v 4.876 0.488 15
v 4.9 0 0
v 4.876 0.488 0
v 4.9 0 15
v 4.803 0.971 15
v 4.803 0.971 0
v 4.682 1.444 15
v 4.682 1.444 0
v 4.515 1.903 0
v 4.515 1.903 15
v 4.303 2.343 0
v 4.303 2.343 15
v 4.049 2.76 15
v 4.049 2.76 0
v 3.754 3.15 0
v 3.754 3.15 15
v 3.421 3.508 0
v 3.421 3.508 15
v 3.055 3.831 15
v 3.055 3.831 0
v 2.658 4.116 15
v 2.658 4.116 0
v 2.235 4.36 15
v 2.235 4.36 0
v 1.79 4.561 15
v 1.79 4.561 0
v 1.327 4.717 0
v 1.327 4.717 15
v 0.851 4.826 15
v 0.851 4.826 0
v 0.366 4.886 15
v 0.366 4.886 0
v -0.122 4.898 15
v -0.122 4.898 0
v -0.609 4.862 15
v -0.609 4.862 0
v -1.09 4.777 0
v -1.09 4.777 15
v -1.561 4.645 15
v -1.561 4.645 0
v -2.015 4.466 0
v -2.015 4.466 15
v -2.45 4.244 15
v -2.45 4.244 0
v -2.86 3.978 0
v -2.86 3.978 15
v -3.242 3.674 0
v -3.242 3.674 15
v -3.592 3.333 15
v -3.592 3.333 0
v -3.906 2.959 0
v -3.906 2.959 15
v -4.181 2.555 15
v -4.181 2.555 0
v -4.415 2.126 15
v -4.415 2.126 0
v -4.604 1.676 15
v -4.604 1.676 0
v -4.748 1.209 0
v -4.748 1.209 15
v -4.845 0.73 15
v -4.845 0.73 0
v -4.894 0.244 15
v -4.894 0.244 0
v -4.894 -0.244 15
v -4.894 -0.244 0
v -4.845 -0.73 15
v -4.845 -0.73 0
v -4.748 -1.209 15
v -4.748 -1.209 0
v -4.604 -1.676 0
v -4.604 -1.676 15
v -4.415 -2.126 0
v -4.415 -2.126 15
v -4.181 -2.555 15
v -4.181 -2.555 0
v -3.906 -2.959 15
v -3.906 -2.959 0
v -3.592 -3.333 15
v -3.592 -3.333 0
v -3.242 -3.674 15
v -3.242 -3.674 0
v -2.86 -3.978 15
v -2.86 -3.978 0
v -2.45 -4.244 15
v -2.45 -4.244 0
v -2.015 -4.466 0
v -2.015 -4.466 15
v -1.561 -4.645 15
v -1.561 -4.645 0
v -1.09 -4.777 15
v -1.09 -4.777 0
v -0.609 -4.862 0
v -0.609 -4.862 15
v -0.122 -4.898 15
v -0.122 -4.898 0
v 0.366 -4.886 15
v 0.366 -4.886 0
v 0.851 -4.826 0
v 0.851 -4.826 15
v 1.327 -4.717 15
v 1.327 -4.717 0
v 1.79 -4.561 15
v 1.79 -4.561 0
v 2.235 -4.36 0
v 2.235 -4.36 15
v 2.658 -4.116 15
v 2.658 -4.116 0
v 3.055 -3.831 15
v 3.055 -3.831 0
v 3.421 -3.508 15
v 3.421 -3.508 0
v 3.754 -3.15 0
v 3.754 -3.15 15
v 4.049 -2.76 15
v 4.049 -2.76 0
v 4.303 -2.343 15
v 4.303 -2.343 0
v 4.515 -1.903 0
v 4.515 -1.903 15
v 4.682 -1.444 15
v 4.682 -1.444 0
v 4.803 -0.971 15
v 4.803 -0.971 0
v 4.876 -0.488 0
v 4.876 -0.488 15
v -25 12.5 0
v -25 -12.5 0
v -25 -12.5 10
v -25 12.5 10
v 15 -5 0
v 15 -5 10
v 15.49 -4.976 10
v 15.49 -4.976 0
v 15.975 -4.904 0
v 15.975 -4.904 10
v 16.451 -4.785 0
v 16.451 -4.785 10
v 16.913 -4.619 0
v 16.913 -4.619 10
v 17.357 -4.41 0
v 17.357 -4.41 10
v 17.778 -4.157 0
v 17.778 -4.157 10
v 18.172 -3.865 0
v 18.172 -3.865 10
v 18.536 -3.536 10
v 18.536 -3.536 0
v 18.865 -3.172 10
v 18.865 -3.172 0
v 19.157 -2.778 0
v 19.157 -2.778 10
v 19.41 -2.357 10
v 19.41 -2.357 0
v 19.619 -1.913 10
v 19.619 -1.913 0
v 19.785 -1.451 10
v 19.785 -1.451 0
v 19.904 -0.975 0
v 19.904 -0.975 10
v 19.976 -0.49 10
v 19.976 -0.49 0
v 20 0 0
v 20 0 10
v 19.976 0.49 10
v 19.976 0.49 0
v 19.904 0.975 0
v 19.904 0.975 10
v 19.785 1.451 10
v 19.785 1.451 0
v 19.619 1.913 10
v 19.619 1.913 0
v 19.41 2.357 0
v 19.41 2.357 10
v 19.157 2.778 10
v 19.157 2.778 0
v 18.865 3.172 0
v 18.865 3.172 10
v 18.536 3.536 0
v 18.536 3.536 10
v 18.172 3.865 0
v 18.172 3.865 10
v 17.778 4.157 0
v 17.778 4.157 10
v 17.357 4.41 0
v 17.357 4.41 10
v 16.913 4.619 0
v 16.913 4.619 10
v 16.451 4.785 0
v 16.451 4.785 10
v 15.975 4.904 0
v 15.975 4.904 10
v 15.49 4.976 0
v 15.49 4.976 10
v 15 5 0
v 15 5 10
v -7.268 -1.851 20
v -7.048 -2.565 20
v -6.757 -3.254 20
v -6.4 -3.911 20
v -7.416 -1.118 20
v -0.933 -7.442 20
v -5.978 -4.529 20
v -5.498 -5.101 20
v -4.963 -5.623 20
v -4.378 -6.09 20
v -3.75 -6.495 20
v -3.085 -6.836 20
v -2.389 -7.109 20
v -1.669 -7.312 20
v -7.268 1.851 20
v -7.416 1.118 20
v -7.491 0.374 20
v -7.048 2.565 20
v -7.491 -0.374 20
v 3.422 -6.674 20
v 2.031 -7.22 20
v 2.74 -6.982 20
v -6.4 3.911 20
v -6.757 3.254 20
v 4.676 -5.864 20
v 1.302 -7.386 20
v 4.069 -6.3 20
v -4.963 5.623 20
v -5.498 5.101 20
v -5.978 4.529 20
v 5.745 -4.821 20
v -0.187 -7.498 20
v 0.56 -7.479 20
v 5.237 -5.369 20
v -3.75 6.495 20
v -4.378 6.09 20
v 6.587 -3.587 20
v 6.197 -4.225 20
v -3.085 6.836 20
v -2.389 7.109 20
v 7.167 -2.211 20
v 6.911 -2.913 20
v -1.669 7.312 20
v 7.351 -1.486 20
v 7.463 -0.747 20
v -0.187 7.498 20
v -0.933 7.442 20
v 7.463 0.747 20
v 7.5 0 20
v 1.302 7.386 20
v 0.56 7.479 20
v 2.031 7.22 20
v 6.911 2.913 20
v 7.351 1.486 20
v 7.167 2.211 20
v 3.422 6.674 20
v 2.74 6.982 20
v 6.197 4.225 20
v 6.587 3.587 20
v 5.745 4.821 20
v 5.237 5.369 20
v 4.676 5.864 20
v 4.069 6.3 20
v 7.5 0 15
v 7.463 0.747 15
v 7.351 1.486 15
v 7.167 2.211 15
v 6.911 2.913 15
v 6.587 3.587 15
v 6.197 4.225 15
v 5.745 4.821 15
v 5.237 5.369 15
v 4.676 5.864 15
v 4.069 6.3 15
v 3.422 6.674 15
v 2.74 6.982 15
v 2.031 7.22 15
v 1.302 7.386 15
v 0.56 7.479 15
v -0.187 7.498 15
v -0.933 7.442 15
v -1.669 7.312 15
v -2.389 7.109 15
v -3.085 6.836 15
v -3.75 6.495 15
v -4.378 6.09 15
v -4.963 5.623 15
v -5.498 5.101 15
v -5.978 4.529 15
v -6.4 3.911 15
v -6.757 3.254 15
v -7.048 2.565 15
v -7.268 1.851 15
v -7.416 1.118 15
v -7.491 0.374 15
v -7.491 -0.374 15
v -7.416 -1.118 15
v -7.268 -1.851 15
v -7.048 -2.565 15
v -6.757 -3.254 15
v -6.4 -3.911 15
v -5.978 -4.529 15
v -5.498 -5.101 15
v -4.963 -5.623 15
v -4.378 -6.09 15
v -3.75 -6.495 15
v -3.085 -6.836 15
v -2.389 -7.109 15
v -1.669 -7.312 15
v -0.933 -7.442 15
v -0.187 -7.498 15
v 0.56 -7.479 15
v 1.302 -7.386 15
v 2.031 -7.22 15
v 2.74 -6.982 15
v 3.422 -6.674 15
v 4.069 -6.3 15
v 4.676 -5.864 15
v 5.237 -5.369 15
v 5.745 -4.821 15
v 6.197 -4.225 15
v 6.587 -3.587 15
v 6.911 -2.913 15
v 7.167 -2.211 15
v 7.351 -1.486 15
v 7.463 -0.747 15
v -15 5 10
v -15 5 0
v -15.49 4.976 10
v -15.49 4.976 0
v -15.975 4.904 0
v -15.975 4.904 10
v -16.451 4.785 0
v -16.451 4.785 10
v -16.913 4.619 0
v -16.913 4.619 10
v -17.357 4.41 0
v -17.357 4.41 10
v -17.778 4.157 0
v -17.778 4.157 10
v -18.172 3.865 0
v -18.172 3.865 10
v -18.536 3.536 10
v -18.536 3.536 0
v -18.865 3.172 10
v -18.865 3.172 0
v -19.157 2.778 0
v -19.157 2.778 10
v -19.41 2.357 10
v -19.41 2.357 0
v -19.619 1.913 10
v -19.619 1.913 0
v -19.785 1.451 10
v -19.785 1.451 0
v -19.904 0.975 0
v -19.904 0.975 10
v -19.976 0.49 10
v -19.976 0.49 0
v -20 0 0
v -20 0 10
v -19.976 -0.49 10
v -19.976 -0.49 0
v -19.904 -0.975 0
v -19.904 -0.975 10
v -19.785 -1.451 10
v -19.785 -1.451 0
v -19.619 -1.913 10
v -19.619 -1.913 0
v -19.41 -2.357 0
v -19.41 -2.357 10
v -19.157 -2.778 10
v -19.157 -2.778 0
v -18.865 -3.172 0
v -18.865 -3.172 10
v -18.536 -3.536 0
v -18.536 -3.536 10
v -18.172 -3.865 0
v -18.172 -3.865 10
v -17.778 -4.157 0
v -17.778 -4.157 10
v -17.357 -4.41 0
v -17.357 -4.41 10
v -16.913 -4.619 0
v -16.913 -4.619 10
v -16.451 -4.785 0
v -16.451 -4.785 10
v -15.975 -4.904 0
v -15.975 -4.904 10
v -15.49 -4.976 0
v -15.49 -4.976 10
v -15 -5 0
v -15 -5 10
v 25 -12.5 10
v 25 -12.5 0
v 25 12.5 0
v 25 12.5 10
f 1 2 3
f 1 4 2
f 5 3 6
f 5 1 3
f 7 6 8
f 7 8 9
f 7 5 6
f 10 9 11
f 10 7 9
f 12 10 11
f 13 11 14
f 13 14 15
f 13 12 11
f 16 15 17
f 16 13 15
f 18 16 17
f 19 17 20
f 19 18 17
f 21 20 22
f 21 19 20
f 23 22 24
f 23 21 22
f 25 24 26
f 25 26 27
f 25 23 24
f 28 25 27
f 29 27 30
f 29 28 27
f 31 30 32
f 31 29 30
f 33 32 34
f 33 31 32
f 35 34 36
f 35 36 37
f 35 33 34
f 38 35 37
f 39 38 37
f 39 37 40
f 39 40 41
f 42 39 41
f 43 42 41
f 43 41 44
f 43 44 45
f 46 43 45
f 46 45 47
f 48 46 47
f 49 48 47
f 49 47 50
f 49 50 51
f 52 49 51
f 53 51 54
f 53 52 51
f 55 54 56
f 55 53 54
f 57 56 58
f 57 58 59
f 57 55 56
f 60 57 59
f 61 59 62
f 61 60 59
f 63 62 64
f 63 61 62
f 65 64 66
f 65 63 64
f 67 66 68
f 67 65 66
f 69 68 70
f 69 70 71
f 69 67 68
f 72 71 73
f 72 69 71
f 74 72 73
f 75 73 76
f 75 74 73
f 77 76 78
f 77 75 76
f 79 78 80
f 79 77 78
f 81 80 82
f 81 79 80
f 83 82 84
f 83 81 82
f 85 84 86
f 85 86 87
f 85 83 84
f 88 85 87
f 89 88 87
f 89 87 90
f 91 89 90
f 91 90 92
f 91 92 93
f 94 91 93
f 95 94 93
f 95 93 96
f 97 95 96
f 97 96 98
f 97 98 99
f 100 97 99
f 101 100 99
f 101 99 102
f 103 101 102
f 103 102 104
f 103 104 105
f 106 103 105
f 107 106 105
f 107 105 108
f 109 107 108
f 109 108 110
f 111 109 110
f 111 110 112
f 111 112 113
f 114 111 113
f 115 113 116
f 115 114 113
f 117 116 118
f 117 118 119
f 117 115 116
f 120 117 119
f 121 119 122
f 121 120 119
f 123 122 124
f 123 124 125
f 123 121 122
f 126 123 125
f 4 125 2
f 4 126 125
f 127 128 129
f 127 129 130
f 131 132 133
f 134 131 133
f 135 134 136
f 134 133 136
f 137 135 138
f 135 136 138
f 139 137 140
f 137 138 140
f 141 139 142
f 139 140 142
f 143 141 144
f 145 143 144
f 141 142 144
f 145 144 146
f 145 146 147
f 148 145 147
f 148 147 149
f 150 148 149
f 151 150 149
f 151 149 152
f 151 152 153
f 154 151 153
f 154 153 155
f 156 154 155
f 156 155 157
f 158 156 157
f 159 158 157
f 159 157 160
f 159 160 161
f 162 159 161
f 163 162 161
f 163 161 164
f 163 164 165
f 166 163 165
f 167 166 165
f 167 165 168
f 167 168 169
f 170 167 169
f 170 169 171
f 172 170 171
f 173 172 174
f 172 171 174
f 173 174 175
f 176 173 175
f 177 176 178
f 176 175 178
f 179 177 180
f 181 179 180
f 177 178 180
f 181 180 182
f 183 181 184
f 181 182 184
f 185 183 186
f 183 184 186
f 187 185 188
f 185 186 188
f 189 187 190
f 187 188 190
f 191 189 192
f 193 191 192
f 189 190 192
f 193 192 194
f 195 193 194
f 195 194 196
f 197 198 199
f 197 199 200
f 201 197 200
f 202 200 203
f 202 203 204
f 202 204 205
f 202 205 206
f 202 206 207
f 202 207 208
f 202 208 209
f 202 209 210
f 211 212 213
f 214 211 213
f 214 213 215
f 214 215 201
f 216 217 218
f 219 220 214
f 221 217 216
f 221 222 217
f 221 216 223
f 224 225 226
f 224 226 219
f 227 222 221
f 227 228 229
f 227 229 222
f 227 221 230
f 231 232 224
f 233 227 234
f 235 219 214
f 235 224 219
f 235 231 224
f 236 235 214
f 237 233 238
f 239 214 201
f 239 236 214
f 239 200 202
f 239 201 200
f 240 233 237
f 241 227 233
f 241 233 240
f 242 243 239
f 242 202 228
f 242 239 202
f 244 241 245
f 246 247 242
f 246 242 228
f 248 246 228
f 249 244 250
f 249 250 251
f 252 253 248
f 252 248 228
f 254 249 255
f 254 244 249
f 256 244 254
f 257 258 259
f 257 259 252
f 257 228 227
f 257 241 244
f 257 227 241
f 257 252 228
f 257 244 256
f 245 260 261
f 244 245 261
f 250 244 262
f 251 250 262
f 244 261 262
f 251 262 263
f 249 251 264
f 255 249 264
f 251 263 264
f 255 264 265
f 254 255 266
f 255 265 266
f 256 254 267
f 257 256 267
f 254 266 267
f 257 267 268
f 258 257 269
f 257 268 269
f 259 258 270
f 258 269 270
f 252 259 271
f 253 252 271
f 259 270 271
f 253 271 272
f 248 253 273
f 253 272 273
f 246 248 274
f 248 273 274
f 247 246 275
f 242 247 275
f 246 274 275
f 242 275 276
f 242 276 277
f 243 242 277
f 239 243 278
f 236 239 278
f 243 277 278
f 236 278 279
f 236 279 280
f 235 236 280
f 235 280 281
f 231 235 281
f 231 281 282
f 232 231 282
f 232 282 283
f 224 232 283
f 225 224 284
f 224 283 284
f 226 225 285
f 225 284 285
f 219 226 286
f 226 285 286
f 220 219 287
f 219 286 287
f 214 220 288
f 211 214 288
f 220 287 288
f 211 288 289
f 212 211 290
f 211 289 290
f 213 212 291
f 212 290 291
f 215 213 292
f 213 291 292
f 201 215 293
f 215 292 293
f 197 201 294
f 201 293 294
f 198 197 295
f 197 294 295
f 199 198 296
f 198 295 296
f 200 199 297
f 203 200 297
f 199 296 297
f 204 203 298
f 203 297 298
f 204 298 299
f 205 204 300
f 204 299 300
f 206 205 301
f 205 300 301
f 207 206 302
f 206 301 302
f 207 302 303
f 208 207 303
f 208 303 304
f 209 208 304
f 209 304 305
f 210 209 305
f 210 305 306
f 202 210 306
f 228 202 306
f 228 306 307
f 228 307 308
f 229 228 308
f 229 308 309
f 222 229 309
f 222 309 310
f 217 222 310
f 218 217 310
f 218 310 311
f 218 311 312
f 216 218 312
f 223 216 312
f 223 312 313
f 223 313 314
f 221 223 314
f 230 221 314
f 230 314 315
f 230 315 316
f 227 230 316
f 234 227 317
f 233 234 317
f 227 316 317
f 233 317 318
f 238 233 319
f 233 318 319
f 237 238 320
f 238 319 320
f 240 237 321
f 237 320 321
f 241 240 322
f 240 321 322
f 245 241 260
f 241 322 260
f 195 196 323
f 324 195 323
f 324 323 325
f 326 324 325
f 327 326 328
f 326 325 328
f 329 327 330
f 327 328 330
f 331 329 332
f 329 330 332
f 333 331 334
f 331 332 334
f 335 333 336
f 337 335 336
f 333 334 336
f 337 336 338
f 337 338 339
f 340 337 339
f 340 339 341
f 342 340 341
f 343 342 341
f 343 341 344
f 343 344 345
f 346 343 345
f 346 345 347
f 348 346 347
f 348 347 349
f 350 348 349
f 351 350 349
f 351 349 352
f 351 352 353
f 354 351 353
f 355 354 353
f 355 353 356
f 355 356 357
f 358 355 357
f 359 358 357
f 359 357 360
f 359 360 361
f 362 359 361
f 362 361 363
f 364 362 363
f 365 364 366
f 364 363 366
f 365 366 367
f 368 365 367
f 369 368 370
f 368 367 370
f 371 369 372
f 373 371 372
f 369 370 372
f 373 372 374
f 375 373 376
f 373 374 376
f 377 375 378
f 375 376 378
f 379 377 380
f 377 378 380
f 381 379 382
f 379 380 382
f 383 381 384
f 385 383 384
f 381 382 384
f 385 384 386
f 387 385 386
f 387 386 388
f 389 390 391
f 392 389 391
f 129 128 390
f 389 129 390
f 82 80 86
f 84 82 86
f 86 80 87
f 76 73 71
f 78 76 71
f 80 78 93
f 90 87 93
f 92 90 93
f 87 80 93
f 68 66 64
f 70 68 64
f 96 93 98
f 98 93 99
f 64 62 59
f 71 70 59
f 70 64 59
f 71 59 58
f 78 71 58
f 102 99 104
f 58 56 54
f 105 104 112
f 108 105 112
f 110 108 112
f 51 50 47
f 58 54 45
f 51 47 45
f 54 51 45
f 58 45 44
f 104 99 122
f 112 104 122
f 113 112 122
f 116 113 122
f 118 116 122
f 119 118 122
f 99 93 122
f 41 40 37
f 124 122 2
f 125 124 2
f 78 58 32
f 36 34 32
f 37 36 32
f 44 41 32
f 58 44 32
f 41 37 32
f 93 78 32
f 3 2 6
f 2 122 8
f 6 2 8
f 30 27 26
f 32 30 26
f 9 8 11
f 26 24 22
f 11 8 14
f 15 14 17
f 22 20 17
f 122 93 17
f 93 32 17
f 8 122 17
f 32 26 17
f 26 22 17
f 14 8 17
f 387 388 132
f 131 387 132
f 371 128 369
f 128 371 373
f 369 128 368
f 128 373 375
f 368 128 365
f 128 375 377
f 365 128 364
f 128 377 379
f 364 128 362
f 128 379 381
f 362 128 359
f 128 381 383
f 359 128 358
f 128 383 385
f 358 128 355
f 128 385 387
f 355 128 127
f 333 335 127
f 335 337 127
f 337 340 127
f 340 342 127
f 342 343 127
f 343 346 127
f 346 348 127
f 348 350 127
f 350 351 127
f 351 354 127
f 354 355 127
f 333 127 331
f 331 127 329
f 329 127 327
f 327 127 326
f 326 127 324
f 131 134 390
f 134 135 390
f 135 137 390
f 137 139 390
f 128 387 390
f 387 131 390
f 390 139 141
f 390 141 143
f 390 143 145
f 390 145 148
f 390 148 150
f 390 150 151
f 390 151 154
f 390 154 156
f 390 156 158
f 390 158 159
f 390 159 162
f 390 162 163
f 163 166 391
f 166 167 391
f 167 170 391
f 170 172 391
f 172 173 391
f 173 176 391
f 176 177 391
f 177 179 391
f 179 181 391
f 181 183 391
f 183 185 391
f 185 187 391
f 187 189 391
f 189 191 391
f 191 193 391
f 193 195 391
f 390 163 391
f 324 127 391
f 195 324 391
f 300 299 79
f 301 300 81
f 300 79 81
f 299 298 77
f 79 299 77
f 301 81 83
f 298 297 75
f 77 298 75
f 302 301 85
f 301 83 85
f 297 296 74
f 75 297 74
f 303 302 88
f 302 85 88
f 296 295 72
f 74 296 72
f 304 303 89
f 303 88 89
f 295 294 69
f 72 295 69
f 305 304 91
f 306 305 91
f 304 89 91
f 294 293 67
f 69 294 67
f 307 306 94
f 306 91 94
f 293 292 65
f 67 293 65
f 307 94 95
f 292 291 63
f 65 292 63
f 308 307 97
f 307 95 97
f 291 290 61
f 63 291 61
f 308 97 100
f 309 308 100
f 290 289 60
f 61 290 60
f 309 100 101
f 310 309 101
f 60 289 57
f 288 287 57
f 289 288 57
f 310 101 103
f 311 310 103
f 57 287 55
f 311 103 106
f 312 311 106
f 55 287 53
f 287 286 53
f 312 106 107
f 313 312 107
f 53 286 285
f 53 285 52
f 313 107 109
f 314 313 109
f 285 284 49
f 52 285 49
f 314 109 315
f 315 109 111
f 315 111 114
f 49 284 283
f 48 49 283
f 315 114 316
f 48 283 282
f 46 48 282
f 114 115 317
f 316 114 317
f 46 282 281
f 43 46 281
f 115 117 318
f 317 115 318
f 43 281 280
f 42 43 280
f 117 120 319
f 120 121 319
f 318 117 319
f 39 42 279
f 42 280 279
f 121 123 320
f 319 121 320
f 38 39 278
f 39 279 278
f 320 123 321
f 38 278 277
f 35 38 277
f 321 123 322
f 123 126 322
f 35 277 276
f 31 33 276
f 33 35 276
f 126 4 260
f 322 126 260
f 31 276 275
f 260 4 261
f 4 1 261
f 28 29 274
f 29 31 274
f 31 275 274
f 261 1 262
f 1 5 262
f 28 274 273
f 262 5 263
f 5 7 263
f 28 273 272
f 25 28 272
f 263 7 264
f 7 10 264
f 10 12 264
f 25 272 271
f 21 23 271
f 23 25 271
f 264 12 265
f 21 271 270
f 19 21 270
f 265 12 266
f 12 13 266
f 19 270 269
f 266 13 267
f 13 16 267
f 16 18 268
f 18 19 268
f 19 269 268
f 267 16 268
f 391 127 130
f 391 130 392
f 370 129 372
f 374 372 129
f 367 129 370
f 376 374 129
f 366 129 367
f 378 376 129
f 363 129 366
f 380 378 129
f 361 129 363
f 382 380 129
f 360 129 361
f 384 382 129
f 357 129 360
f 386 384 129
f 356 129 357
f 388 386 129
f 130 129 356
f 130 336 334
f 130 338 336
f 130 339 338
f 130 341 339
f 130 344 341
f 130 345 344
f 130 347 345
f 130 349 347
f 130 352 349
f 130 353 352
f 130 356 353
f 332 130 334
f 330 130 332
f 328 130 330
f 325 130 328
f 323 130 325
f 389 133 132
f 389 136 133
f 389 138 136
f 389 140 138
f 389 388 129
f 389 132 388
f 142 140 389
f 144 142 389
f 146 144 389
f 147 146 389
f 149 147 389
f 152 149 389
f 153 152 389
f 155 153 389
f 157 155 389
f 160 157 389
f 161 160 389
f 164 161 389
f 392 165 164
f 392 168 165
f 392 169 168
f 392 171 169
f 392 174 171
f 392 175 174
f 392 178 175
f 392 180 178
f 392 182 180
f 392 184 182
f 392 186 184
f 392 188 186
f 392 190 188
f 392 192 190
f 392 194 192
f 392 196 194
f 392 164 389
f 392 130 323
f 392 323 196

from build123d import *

# Parameters (mm, degrees)
F0_W          = 50
F0_H          = 25
F1_DEPTH      = 10
F3_DEPTH      = 10.001
F4_R          = 4.9
F5_DEPTH      = 5
F5_DEPTH_BACK = 10
F6_R          = 7.5
F6_R_2        = 4.9
F7_DEPTH      = 5


with BuildPart() as f1:
    # F0 (on Top) → F1 (new body)
    with BuildSketch(Plane.XY):
        Rectangle(F0_W, F0_H)
    extrude(amount=F1_DEPTH)

    # F2 (on face) → F3 (cut, through all)
    with BuildSketch(Plane.XY.offset(10)):
        with BuildLine():
            ThreePointArc((15, -5), (20, 0), (15, 5))
            Line((15, 5), (-15, 5))
            ThreePointArc((-15, 5), (-20, 0), (-15, -5))
            Line((-15, -5), (15, -5))
        make_face()
    extrude(amount=-F3_DEPTH, mode=Mode.SUBTRACT)


with BuildPart() as f5:
    # F4 (on face) → F5 (new body, two sides)
    with BuildSketch(Plane.XY.offset(10)) as f5_sk:
        Circle(F4_R)
    extrude(amount=F5_DEPTH)
    extrude(f5_sk.sketch, amount=-F5_DEPTH_BACK)

    # F6 (on face) → F7 (join)
    with BuildSketch(Plane.XY.offset(15)):
        Circle(F6_R)
        Circle(F6_R_2, mode=Mode.SUBTRACT)
        Circle(F6_R_2)
    extrude(amount=F7_DEPTH)


solid = Compound([f1.part, f5.part])
